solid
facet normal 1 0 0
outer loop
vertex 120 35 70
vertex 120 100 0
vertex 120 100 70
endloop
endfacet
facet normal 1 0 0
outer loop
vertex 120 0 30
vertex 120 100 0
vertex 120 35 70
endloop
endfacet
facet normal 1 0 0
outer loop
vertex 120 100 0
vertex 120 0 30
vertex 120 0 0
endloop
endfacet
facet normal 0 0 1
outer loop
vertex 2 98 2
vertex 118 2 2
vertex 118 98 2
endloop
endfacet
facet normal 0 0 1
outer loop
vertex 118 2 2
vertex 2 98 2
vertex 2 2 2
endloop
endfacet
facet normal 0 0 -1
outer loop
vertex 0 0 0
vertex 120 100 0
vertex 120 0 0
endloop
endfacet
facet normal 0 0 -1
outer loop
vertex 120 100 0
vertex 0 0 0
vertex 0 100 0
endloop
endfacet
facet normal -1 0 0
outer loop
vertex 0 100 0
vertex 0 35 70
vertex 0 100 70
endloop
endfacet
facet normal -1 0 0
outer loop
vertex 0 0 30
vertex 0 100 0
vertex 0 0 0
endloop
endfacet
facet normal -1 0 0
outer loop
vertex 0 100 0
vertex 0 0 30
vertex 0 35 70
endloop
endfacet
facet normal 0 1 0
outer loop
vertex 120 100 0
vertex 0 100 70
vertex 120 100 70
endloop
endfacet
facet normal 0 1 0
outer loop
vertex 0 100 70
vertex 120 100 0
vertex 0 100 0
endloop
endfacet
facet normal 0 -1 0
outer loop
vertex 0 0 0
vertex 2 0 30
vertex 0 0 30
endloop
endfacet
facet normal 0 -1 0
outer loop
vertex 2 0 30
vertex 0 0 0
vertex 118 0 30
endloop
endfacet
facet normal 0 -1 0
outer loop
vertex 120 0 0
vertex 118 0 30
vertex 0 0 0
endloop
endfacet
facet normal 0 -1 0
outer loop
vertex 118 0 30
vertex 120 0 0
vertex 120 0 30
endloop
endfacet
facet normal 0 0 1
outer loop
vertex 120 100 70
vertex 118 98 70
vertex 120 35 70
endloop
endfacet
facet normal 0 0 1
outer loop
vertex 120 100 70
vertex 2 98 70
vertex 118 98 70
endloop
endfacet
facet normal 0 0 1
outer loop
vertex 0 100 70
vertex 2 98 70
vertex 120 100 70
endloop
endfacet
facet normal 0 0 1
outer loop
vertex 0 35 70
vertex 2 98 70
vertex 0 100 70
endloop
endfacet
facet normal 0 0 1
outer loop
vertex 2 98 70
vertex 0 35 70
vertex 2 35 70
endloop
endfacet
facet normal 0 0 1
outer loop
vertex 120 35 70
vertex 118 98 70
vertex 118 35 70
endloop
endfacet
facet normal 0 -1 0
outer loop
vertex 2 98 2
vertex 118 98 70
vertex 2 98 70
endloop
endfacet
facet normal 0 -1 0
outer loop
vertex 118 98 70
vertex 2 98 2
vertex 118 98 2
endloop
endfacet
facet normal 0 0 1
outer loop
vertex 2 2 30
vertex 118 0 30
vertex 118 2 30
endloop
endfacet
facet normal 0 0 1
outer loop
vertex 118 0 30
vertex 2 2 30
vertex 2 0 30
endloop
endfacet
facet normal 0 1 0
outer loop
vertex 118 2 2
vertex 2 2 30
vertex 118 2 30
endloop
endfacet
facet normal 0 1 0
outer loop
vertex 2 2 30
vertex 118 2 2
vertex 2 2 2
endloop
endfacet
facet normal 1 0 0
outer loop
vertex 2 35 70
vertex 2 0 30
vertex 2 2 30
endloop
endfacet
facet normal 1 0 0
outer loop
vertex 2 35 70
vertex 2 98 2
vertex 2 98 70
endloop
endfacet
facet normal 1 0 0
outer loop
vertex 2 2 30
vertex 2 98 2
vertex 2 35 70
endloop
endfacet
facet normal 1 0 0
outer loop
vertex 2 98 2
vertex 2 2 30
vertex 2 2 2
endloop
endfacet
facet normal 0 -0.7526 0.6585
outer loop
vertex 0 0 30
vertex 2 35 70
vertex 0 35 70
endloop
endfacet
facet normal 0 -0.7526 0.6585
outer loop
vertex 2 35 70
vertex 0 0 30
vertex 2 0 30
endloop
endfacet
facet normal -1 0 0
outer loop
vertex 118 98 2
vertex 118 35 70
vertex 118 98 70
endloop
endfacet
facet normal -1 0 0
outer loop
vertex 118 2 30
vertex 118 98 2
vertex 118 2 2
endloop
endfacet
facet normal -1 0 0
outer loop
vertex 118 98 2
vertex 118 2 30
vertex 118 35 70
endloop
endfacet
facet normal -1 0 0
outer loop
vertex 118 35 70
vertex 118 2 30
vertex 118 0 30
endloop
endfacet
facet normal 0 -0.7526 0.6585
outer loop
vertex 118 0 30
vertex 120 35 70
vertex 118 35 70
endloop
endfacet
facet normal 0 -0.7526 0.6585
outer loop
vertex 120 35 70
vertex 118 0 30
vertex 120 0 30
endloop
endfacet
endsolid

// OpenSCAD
// ============================================================
//  Parametric Open-Front Storage Bin
//  (low front wall + diagonal chamfer on side walls)
//  Units: millimetres
//  MakerWorld Parametric Maker compatible
// ============================================================

/* [Printer / Build Volume] */
// Printer preset. "Custom" uses the max_* values below; presets override them.
printer = "H2D"; // [P1S, P2S, H2C, H2D, Custom]
// Custom max build width (X) in mm — used only when printer = "Custom"
max_build_x = 350; // [100:1:500]
// Custom max build depth (Y) in mm — used only when printer = "Custom"
max_build_y = 320; // [100:1:500]
// Custom max build height (Z) in mm — used only when printer = "Custom"
max_build_z = 325; // [100:1:500]

/* [Outer Dimensions] */
// Width (left-right) in mm (auto-capped to printer build X)
width = 120;        // [40:1:500]
// Depth (front-back) in mm (auto-capped to printer build Y)
depth = 100;        // [40:1:500]
// Total height (back wall) in mm (auto-capped to printer build Z)
height = 70;        // [20:1:500]

/* [Front Opening] */
// Height of the short front wall in mm (auto-capped to height - 5)
front_height = 30;  // [5:1:495]
// Length of the diagonal chamfer on the side walls (along Y, from the front). 0 = vertical step. Auto-capped to depth - wall.
chamfer_len = 35;   // [0:1:495]

/* [Walls] */
// Side / front / back wall thickness in mm
wall = 2.0;         // [1.2:0.1:4.0]
// Floor thickness in mm
floor_t = 2.0;      // [1.2:0.1:4.0]

/* [Cosmetic] */
// Outer bottom edge chamfer (elephant-foot relief) in mm
bottom_chamfer = 0.6;  // [0:0.1:2.0]

/* [Quality] */
// Render smoothness ($fn). Higher = smoother but slower.
$fn = 64;           // [16:8:128]

// ============================================================
//  Printer build-volume lookup (X, Y, Z in mm)
//  Update here if Bambu publishes revised specs.
// ============================================================
_bv =
    (printer == "P1S") ? [256, 256, 256] :
    (printer == "P2S") ? [256, 256, 256] :
    (printer == "H2C") ? [330, 320, 325] :
    (printer == "H2D") ? [350, 320, 325] :
                         [max_build_x, max_build_y, max_build_z]; // Custom

_max_x = _bv[0];
_max_y = _bv[1];
_max_z = _bv[2];

// ============================================================
//  Internal clamped values (keep geometry valid for any UI input)
// ============================================================
// Clamp outer dims to selected printer build volume first
_width  = min(width,  _max_x);
_depth  = min(depth,  _max_y);
_height = min(height, _max_z);

_fh = min(front_height, _height - 5);                  // front wall < back wall
_cl = max(0, min(chamfer_len, _depth - wall));         // chamfer fits in depth
_wall   = min(wall,   min(_width, _depth) / 2 - 1);    // walls fit in footprint
_floor  = min(floor_t, _height - 1);                   // floor < height

// ============================================================
//  Geometry
// ============================================================

module bin() {
    difference() {
        union() {
            // Floor
            cube([_width, _depth, _floor]);

            // Back wall (full height)
            translate([0, _depth - _wall, 0])
                cube([_width, _wall, _height]);

            // Front wall (short)
            cube([_width, _wall, _fh]);

            // Left side wall
            side_wall();

            // Right side wall (mirrored)
            translate([_width, 0, 0])
                mirror([1, 0, 0])
                    side_wall();
        }

        // Outer bottom chamfer (elephant-foot relief)
        if (bottom_chamfer > 0) bottom_chamfer_cut();
    }
}

// One side wall, sitting at x = 0 .. _wall.
// 2D profile drawn in the YZ-plane, then extruded in X.
module side_wall() {
    pts = [
        [0,      0],           // front-bottom
        [_depth, 0],           // back-bottom
        [_depth, _height],     // back-top
        [_cl,    _height],     // start of diagonal
        [0,      _fh],         // top of front wall
    ];

    rotate([90, 0, 90])
        linear_extrude(height = _wall)
            polygon(points = pts);
}

// 45° chamfer around the outer bottom perimeter (4 triangular prisms)
module bottom_chamfer_cut() {
    c = bottom_chamfer;
    // Front
    translate([-0.01, -0.01, -0.01])
        rotate([0, 90, 0])
            linear_extrude(height = _width + 0.02)
                polygon([[0,0],[c,0],[0,c]]);
    // Back
    translate([-0.01, _depth + 0.01, -0.01])
        rotate([0, 90, 0])
            linear_extrude(height = _width + 0.02)
                polygon([[0,0],[c,0],[0,-c]]);
    // Left
    translate([-0.01, -0.01, -0.01])
        rotate([-90, 0, 90])
            linear_extrude(height = _depth + 0.02)
                polygon([[0,0],[c,0],[0,c]]);
    // Right
    translate([_width + 0.01, -0.01, -0.01])
        rotate([-90, 0, 90])
            linear_extrude(height = _depth + 0.02)
                polygon([[0,0],[-c,0],[0,c]]);
    }

bin();
